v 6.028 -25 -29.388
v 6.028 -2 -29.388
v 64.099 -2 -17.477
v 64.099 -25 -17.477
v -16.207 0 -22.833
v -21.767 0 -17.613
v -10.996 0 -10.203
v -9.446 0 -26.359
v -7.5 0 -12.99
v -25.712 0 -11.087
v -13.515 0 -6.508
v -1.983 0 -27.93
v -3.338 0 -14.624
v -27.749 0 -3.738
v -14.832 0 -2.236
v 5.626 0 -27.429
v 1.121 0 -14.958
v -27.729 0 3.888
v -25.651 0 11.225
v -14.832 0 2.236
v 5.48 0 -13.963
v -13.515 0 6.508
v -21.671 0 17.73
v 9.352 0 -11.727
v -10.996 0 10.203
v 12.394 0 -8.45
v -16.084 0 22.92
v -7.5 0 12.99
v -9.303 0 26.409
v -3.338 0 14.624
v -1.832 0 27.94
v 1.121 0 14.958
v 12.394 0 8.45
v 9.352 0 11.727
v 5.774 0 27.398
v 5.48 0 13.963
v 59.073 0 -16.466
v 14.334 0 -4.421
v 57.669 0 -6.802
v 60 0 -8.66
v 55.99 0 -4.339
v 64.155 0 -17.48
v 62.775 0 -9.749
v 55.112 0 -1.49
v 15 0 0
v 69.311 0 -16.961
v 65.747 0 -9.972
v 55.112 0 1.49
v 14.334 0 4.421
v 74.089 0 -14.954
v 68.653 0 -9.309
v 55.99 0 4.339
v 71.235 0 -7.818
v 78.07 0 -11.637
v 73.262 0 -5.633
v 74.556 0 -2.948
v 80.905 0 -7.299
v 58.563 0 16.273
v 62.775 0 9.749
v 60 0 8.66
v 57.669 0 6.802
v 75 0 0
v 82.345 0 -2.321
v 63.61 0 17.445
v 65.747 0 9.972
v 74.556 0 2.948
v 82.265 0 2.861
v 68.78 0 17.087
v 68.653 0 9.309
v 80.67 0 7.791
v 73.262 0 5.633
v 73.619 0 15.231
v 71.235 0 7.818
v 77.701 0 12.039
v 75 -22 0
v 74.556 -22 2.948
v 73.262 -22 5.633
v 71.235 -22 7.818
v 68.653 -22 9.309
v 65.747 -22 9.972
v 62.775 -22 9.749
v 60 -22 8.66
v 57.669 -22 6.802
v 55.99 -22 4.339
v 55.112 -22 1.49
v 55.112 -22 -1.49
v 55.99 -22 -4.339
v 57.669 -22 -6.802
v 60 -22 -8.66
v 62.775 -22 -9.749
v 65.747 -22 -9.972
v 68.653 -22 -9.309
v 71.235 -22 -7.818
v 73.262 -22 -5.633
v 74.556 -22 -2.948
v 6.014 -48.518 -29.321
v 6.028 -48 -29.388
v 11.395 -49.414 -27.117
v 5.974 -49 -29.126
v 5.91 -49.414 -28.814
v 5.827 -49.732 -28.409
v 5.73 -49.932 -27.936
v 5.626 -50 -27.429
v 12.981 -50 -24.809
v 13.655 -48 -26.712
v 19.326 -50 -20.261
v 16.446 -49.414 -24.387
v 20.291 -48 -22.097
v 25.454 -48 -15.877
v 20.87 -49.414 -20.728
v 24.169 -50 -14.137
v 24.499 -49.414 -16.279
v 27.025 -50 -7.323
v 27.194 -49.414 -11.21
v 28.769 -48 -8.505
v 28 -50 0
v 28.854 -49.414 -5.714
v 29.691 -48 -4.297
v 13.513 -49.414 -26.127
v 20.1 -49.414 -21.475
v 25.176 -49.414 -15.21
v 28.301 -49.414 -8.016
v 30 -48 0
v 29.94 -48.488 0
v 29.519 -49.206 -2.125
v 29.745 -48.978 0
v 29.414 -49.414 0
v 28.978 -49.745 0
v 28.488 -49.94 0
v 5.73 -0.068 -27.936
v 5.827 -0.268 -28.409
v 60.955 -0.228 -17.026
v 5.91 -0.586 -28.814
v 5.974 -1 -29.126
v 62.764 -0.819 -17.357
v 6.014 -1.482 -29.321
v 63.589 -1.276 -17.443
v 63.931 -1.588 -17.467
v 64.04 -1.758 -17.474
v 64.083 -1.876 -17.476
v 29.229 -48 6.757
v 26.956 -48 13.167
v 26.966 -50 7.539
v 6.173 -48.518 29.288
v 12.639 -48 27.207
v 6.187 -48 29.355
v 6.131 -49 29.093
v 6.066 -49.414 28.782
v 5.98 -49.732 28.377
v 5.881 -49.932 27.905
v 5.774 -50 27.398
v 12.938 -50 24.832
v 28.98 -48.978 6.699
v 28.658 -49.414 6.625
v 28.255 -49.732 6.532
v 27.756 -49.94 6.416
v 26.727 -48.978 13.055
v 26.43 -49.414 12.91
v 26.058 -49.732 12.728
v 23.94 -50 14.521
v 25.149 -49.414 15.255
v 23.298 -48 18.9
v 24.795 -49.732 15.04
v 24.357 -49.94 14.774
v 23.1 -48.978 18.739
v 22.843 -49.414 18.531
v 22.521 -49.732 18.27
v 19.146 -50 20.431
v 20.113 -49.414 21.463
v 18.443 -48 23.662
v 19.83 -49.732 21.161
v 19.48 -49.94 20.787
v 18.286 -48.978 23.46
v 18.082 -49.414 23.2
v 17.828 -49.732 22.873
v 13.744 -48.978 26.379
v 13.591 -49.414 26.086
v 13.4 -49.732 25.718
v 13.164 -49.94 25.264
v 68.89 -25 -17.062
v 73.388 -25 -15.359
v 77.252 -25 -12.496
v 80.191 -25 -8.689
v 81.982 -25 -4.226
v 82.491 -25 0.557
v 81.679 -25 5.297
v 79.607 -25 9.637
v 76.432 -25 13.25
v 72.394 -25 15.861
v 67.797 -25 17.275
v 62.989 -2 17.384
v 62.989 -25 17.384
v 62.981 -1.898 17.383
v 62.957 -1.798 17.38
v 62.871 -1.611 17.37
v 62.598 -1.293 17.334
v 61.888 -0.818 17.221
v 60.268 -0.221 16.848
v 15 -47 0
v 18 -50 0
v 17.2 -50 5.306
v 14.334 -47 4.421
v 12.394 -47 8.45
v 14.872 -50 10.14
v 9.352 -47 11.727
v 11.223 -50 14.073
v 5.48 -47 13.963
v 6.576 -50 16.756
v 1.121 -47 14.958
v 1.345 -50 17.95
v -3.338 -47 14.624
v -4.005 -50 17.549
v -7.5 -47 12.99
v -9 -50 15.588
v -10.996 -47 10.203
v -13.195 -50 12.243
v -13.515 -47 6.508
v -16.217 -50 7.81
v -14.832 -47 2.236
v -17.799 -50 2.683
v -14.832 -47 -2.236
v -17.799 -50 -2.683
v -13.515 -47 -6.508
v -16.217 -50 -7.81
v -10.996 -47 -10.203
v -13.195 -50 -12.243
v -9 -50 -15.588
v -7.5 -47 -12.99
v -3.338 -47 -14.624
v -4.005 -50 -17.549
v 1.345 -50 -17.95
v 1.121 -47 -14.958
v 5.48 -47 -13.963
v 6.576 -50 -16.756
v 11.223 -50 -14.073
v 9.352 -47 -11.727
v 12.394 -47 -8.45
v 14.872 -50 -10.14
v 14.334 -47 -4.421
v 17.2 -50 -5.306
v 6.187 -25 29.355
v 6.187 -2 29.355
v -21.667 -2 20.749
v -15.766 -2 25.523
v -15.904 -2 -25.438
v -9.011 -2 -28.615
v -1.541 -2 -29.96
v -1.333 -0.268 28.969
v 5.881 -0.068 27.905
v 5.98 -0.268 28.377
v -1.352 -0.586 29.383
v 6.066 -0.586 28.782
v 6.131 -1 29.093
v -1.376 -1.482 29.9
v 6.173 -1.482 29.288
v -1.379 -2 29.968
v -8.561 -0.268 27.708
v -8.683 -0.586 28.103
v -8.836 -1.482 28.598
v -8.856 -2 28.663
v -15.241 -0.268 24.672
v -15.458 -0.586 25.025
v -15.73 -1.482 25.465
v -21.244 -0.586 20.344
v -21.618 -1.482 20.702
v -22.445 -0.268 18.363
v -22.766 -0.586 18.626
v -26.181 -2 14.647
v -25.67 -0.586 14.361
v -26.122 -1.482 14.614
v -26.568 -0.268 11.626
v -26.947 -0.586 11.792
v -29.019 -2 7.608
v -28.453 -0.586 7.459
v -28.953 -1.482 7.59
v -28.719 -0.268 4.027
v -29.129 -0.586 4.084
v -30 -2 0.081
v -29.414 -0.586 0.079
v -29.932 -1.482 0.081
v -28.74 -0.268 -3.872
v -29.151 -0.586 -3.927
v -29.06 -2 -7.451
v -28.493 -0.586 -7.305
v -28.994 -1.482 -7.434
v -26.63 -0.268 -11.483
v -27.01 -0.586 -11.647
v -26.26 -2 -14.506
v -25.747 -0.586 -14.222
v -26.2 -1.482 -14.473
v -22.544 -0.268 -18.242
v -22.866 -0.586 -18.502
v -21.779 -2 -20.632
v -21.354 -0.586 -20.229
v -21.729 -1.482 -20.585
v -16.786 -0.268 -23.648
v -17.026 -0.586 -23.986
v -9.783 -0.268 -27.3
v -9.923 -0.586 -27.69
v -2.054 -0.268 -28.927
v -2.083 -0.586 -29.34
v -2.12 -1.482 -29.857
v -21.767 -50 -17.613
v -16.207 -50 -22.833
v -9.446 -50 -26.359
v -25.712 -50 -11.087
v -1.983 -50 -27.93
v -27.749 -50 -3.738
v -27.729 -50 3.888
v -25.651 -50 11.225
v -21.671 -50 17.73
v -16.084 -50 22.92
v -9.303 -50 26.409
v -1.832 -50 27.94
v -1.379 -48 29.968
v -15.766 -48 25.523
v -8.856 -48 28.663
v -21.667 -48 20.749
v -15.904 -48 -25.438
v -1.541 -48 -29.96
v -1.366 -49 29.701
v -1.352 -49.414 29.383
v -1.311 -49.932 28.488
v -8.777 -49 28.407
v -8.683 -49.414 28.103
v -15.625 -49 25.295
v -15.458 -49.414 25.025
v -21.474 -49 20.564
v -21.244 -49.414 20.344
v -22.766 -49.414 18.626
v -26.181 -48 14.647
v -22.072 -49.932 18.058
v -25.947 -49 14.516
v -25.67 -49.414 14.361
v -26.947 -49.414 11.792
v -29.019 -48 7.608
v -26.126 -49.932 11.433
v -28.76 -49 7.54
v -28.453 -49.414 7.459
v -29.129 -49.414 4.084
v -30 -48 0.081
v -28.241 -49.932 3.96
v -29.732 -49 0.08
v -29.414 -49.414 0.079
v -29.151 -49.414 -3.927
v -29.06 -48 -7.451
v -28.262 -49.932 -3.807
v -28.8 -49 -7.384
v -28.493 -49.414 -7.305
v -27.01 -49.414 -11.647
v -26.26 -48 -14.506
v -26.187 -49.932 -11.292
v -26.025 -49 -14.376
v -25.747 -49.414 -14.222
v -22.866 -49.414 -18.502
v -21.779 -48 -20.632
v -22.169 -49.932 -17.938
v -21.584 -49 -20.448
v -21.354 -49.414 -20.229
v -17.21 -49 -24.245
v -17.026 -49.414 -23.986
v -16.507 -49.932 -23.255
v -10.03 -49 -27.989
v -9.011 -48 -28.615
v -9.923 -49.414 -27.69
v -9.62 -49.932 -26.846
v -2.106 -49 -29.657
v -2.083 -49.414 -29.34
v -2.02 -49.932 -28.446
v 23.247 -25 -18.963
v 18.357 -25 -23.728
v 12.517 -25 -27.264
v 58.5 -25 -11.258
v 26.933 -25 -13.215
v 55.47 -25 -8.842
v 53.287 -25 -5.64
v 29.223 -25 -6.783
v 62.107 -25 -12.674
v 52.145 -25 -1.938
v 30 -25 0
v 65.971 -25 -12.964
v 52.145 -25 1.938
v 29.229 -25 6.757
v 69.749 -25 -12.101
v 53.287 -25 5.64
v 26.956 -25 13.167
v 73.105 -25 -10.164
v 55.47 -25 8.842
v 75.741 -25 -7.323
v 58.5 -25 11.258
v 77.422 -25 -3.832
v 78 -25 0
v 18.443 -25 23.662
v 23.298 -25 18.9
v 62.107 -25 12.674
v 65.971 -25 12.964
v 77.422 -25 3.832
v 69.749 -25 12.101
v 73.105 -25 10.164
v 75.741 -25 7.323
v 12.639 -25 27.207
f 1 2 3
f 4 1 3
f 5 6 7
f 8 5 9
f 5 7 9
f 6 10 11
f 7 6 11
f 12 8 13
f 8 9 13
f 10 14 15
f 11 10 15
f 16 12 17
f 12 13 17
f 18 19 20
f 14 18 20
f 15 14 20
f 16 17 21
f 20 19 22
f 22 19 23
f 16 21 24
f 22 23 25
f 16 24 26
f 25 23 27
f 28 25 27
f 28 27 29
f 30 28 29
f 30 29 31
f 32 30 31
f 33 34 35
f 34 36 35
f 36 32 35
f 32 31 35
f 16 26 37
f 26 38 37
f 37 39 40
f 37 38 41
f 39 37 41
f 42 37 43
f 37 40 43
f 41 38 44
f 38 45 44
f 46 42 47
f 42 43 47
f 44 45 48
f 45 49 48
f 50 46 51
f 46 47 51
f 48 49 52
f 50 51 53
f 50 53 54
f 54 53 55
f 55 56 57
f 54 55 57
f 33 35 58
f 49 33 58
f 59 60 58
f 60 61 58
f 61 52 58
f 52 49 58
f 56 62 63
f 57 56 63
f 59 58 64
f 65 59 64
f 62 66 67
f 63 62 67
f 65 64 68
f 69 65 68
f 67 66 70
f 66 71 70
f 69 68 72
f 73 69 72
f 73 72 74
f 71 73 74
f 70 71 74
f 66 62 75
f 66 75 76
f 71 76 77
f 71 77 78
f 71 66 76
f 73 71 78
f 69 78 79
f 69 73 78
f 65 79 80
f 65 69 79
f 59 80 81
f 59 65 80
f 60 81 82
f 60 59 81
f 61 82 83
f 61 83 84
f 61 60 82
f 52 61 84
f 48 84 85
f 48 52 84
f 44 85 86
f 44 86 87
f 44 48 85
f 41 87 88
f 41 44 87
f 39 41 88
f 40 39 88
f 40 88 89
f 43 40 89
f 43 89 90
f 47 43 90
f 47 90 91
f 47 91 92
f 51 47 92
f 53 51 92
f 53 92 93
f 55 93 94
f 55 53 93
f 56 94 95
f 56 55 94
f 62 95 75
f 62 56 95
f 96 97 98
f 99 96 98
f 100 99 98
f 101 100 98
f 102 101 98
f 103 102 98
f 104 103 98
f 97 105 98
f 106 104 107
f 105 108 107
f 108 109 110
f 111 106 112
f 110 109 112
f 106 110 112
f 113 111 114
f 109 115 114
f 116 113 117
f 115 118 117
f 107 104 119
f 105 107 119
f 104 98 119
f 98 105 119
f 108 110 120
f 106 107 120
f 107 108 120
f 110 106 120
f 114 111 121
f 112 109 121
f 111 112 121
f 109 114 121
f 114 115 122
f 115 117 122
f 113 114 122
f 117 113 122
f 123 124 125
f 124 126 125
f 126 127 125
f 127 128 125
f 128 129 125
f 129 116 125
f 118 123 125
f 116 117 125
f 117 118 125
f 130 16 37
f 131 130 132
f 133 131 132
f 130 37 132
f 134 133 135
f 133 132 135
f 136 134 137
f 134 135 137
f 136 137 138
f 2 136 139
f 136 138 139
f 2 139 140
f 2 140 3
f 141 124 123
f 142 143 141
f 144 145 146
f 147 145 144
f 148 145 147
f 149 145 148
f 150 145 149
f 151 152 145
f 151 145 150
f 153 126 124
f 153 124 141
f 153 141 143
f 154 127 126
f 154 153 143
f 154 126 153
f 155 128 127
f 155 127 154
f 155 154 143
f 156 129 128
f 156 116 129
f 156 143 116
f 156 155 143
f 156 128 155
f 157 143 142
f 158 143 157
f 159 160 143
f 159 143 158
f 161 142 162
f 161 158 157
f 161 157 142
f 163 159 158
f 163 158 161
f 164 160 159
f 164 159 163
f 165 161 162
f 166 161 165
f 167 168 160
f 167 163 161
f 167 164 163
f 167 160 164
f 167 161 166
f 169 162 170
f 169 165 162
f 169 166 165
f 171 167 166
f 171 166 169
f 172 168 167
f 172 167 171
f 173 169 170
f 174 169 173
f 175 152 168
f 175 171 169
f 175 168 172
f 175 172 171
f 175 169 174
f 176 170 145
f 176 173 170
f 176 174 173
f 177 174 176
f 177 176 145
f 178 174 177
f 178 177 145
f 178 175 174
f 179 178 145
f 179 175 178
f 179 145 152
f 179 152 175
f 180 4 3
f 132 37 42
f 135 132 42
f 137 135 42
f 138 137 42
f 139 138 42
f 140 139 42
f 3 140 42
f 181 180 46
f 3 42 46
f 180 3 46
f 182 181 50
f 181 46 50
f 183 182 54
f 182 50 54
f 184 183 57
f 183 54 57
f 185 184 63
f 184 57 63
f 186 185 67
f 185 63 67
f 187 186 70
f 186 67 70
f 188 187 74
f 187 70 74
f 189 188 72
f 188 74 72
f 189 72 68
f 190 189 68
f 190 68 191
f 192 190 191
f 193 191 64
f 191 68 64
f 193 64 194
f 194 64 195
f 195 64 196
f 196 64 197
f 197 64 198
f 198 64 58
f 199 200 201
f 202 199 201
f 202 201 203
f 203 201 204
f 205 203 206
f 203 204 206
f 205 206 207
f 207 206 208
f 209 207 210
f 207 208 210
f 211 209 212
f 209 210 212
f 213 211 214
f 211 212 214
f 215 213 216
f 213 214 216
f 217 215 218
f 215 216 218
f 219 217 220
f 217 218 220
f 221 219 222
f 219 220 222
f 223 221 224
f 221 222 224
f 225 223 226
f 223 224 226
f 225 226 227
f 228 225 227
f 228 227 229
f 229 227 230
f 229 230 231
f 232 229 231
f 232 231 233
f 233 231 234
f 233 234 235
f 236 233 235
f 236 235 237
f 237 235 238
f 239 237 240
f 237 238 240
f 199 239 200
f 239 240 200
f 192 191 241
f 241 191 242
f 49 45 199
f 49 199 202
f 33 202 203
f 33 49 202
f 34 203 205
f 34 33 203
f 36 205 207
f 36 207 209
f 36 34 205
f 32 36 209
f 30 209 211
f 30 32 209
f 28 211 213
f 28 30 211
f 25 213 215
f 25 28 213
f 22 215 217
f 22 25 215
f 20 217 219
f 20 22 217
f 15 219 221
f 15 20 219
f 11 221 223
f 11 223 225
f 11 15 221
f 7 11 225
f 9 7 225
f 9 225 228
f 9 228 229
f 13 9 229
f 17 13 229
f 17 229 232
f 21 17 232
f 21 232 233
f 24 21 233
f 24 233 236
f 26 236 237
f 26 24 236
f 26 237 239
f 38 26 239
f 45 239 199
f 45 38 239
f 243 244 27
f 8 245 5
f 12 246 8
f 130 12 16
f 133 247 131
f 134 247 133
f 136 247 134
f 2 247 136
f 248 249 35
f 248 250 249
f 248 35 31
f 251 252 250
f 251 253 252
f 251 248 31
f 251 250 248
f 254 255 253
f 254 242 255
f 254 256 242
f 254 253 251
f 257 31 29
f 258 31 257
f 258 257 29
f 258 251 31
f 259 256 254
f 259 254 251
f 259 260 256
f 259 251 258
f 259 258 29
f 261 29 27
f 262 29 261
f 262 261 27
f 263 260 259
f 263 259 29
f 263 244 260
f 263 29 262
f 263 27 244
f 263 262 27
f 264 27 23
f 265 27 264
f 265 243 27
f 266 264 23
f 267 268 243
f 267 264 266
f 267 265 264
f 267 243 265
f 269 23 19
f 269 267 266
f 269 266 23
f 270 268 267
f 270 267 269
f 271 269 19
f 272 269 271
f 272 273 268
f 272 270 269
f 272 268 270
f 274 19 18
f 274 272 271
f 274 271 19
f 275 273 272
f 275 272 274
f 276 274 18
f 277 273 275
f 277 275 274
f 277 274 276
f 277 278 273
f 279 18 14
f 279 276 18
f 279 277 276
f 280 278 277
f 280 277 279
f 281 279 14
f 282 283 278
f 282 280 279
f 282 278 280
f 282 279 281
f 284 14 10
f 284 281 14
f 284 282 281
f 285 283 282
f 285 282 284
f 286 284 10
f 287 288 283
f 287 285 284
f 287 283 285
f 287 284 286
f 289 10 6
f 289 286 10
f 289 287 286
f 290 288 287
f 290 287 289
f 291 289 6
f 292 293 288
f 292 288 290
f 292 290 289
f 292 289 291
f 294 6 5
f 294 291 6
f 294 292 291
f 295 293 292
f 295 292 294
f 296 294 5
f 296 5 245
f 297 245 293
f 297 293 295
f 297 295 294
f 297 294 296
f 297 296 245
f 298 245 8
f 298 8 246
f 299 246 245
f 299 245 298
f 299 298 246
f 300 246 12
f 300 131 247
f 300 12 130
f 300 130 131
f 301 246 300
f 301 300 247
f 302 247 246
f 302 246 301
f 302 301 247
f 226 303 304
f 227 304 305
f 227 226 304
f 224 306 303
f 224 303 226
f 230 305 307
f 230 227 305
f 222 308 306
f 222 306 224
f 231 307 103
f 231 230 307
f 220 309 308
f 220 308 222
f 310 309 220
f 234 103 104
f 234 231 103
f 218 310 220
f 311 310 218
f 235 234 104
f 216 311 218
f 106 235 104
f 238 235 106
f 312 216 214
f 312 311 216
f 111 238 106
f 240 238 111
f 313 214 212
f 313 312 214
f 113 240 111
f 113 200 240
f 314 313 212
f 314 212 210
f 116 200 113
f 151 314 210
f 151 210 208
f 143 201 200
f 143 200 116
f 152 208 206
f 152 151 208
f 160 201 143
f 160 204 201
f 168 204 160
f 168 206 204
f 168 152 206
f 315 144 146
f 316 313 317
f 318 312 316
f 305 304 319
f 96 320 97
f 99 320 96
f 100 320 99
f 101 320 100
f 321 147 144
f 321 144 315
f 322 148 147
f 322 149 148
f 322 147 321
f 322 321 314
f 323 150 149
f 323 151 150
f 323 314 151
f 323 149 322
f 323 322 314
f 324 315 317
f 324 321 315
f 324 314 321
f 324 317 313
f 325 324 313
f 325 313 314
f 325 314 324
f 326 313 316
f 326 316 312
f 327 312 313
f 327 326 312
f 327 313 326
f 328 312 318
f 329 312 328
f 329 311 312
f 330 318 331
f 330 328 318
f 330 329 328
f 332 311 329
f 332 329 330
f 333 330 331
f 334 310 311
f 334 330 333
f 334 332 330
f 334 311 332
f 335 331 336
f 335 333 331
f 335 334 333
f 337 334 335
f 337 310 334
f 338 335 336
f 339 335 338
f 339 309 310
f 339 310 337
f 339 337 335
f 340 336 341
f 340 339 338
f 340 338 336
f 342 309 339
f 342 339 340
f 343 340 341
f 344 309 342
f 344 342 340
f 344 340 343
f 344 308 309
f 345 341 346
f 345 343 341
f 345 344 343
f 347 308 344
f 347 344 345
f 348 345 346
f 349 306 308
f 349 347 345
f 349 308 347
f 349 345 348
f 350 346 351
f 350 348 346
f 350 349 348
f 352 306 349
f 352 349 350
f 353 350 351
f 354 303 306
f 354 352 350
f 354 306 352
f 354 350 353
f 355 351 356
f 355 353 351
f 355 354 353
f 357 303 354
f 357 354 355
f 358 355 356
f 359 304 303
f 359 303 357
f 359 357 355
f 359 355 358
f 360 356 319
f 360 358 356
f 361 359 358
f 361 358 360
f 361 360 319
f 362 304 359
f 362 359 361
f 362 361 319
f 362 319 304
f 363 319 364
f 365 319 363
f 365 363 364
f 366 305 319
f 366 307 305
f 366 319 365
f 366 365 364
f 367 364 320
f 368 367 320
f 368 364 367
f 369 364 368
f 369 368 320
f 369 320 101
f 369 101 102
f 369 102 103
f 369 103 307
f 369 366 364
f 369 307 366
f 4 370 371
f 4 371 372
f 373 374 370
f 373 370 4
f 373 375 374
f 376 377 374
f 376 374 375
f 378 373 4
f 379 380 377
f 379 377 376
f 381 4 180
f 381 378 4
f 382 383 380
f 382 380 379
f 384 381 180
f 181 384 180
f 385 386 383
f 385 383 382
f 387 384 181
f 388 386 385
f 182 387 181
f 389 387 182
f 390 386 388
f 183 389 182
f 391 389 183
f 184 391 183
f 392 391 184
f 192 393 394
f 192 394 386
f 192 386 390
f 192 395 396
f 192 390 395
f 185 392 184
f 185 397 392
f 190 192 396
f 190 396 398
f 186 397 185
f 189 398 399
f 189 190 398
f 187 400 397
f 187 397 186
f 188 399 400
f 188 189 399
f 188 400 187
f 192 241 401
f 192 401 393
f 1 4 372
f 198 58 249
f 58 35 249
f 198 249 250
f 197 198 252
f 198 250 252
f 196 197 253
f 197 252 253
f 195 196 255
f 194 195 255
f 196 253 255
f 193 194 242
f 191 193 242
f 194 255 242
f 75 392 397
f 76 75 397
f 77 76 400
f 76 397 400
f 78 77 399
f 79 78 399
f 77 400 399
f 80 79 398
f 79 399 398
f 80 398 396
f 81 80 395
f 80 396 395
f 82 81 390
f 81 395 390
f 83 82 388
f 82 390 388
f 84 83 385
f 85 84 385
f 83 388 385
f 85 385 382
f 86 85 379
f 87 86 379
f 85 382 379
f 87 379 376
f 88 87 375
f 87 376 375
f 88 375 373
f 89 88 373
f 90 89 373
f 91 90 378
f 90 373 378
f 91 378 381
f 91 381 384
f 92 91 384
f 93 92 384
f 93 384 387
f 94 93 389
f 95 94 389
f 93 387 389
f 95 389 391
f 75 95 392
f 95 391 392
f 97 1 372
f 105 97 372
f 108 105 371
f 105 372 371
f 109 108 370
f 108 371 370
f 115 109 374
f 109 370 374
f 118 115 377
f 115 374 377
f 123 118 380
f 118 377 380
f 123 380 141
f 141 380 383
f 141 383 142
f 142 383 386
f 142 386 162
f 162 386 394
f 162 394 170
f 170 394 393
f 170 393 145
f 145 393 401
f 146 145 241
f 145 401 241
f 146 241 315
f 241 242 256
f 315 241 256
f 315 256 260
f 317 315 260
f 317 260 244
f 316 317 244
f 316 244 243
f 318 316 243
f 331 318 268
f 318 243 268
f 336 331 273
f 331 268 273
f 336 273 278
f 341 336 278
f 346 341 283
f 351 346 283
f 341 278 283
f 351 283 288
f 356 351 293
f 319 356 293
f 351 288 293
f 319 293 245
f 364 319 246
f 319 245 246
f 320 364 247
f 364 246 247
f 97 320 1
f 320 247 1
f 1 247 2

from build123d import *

# Parameters (mm, degrees)
F0_R     = 15
F0_R_2   = 10
F1_DEPTH = 25
F2_DEPTH = 50
F3_SIZE  = 3
F4_R     = 2


with BuildPart() as f1:
    # F0 (on Front) → F1 (new body)
    with BuildSketch(Plane.XZ):
        with BuildLine():
            ThreePointArc((6.0280672627, -29.3881337461), (23.2469569824, -18.9625681557), (30, 0))
            ThreePointArc((30, 0), (23.2980522028, 18.899755648), (6.186615763, 29.3551662472))
            ThreePointArc((6.186615763, 29.3551662472), (-29.9998907311, 0.0809698754), (6.0280672627, -29.3881337461))
        make_face()
        Circle(F0_R, mode=Mode.SUBTRACT)
        with BuildLine():
            ThreePointArc((6.186615763, 29.3551662472), (23.2980522028, 18.899755648), (30, 0))
            ThreePointArc((30, 0), (23.2469569824, -18.9625681557), (6.0280672627, -29.3881337461))
            Line((6.0280672627, -29.3881337461), (64.0985580176, -17.476767503))
            ThreePointArc((64.0985580176, -17.476767503), (47.5088589909, -0.5567640428), (62.9888960495, 17.384057665))
            Line((62.9888960495, 17.384057665), (6.186615763, 29.3551662472))
        make_face()
        with BuildLine():
            ThreePointArc((82.5, 0), (76.6416425144, 13.0660690174), (62.9888960495, 17.384057665))
            ThreePointArc((62.9888960495, 17.384057665), (47.5088589909, -0.5567640428), (64.0985580176, -17.476767503))
            ThreePointArc((64.0985580176, -17.476767503), (77.0514473261, -12.6890747238), (82.5, 0))
        make_face()
        with Locations((65, 0)):
            Circle(F0_R_2, mode=Mode.SUBTRACT)
    extrude(amount=F1_DEPTH)

    # F0 (on Front) → F2 (join)
    with BuildSketch(Plane.XZ):
        with BuildLine():
            ThreePointArc((6.0280672627, -29.3881337461), (23.2469569824, -18.9625681557), (30, 0))
            ThreePointArc((30, 0), (23.2980522028, 18.899755648), (6.186615763, 29.3551662472))
            ThreePointArc((6.186615763, 29.3551662472), (-29.9998907311, 0.0809698754), (6.0280672627, -29.3881337461))
        make_face()
        Circle(F0_R, mode=Mode.SUBTRACT)
    extrude(amount=F2_DEPTH)

    # F3
    f3_edges = [f1.edges().sort_by_distance(p)[0] for p in [
        (-15, -50, 0),
        (55, -25, 0),
    ]]
    chamfer(f3_edges, length=F3_SIZE)

    # F4
    f4_edges = [f1.edges().sort_by_distance(p)[0] for p in [
        (-6.028067, -50, 29.388134),
        (35.063313, 0, -23.432451),
    ]]
    fillet(f4_edges, radius=F4_R)


solid = f1.part
